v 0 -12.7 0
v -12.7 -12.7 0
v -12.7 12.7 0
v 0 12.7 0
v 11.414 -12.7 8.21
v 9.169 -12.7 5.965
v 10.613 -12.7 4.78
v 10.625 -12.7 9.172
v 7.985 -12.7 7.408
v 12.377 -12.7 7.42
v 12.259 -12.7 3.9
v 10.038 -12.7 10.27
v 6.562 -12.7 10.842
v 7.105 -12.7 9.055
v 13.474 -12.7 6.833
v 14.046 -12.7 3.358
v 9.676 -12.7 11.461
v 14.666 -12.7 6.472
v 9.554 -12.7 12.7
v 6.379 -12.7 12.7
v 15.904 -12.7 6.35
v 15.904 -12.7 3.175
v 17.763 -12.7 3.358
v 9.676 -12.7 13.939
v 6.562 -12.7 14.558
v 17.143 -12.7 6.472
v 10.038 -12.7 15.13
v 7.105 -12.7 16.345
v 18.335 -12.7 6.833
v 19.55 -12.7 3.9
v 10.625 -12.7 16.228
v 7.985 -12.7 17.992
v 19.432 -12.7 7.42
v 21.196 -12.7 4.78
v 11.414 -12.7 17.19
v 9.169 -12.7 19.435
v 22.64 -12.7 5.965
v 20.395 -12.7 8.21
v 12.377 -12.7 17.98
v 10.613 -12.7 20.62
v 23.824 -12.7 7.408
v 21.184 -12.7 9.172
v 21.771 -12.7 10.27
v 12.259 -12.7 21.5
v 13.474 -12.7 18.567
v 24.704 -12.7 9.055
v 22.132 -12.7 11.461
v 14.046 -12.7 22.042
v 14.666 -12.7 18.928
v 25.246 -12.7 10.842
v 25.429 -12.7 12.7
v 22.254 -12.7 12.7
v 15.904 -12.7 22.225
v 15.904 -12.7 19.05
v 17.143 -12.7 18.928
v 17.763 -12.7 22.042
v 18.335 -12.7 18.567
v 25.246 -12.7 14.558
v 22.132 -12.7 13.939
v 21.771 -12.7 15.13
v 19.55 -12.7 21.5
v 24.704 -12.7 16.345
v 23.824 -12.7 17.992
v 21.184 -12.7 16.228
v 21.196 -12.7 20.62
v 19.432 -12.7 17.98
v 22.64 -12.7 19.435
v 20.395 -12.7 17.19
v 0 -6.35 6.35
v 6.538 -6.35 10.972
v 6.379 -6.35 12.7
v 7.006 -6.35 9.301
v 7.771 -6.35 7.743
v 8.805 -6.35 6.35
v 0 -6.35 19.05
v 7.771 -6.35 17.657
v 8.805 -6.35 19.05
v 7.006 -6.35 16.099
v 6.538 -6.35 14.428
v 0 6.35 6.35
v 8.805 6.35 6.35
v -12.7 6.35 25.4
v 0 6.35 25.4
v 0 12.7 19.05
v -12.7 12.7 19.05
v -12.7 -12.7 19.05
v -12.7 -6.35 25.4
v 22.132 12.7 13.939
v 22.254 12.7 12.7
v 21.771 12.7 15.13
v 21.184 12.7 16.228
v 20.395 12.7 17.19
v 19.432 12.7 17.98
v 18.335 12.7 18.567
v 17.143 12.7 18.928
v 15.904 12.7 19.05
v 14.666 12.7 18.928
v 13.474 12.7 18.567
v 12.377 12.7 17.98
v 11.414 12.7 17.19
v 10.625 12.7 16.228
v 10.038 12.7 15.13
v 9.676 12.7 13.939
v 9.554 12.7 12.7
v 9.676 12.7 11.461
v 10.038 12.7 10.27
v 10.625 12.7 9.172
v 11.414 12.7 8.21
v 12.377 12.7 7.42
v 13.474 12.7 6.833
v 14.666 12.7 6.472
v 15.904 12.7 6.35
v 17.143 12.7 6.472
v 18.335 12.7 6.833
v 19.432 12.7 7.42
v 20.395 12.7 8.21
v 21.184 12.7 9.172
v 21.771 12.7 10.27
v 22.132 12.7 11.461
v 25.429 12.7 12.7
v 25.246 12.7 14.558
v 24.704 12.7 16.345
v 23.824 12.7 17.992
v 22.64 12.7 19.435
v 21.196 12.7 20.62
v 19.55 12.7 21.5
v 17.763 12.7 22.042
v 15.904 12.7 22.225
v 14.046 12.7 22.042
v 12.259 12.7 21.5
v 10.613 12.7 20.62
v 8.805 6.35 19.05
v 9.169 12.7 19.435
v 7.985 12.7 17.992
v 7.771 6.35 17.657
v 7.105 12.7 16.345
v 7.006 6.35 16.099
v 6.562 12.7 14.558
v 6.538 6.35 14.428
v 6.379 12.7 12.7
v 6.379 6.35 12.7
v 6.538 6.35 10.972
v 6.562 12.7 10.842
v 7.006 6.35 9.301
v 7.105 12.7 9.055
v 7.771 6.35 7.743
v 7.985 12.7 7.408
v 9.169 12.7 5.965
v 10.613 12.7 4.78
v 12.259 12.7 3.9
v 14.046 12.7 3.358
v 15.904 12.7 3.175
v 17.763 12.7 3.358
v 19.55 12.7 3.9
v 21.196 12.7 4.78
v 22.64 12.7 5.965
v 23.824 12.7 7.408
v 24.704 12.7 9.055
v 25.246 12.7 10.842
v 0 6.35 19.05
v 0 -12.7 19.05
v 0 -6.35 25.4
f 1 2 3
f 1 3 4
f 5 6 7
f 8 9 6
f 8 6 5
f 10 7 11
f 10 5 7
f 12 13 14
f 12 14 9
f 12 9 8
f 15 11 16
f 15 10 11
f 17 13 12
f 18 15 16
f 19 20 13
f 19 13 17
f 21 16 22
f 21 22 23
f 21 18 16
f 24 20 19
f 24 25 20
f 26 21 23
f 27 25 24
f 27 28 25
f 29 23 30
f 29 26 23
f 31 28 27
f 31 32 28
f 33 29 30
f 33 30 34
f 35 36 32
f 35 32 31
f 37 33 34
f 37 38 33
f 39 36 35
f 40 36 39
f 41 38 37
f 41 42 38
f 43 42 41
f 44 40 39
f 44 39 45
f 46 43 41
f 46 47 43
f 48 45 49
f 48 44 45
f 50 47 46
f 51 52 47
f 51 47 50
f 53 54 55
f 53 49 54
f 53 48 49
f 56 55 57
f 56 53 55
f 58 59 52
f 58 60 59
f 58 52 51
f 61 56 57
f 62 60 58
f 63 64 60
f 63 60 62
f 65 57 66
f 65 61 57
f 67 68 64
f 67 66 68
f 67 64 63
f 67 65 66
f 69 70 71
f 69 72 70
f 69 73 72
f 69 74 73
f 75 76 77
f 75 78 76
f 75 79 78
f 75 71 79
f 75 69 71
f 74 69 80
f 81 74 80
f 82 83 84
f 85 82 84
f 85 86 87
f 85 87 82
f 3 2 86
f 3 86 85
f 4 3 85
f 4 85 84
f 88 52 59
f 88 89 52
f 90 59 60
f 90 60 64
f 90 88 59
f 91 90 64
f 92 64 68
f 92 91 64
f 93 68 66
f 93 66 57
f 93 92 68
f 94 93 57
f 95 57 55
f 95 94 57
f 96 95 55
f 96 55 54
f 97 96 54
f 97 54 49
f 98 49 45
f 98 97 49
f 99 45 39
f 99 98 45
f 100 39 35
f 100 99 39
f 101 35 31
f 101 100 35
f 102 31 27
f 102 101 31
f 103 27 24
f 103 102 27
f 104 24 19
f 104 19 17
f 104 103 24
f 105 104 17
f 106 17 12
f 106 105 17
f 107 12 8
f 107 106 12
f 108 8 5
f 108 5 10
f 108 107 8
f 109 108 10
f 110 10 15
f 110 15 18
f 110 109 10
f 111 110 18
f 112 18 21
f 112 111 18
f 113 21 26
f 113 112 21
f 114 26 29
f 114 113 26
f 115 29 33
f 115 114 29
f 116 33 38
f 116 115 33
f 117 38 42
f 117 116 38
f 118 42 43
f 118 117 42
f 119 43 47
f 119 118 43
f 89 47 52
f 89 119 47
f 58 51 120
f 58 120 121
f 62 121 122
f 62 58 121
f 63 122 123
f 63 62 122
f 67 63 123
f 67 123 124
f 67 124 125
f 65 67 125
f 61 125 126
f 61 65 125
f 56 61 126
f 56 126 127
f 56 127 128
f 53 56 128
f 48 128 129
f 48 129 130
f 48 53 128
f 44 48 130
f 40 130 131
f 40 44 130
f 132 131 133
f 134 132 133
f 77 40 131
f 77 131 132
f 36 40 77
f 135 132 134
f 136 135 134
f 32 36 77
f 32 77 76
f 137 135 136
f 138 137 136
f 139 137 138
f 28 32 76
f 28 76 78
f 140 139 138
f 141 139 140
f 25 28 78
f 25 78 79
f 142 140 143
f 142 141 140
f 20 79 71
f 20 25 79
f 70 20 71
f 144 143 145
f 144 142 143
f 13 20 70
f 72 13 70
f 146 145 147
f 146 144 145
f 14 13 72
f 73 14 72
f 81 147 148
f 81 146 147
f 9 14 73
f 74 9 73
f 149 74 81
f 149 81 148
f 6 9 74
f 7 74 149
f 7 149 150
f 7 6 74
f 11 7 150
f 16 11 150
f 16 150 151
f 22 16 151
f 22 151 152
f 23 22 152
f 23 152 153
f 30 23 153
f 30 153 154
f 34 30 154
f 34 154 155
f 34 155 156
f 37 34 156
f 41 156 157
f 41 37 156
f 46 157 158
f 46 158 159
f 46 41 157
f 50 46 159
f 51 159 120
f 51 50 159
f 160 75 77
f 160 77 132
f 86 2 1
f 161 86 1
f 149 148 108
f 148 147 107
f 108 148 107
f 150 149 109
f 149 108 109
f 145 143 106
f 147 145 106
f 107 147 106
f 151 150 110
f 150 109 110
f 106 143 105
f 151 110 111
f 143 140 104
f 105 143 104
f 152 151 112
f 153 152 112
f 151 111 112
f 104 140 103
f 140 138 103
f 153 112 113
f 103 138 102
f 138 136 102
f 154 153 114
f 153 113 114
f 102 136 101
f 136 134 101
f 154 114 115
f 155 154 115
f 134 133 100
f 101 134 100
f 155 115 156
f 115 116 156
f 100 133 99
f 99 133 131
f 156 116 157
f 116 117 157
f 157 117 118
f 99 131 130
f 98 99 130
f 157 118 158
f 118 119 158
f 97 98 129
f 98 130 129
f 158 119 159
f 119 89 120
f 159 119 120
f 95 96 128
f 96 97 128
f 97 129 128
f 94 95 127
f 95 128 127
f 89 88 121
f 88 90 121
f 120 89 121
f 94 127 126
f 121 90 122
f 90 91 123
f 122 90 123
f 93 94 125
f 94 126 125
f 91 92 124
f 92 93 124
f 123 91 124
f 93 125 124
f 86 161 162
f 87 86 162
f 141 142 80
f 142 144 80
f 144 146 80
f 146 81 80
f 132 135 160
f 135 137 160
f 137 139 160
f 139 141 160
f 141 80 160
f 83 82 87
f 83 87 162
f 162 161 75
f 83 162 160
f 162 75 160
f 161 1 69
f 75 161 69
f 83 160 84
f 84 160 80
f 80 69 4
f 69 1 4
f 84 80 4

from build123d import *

# Parameters (mm, degrees)
F0_W      = 12.7
F0_H      = 25.4
F1_DEPTH  = 25.4
F3_DEPTH  = 25.4
F5_DEPTH  = 25.4
F6_W      = 12.7
F6_H      = 12.7
F7_DEPTH  = 12.7
F8_R      = 9.525
F8_R_2    = 6.35
F9_DEPTH  = 12.7
F11_DEPTH = 25.4


with BuildPart() as f1:
    # F0 (on Top) → F1 (new body)
    with BuildSketch(Plane.XY):
        with Locations((-6.35, 0)):
            Rectangle(F0_W, F0_H)
    extrude(amount=F1_DEPTH)

    # F2 (on face) → F3 (cut)
    with BuildSketch(Plane.YZ):
        Polygon((-12.7, 19.05), (-6.35, 25.4), (-12.7, 25.4), align=None)
    extrude(amount=-F3_DEPTH, mode=Mode.SUBTRACT)

    # F4 (on face) → F5 (cut)
    with BuildSketch(Plane.YZ):
        Polygon((12.7, 25.4), (6.35, 25.4), (12.7, 19.05), align=None)
    extrude(amount=-F5_DEPTH, mode=Mode.SUBTRACT)

    # F6 (on face) → F7 (join)
    with BuildSketch(Plane.YZ):
        with Locations((0, 12.7)):
            Rectangle(F6_W, F6_H)
    extrude(amount=F7_DEPTH)


with BuildPart() as f9:
    # F8 (on Front) → F9 (new body, symmetric)
    with BuildSketch(Plane.XZ):
        with Locations((15.9044696867, 12.7)):
            Circle(F8_R)
        with Locations((15.9044696867, 12.7)):
            Circle(F8_R_2, mode=Mode.SUBTRACT)
    extrude(amount=F9_DEPTH, both=True)


with BuildPart() as f1_1:
    add(f1.part)

    # F10: union F9
    add(f9.part)

    # F11 (cut): a face of the model
    f11_faces = [f1_1.faces().sort_by_distance(p)[0] for p in [
        (11.4105492836, -6.35, 12.7),
    ]]
    extrude(f11_faces, amount=-F11_DEPTH, mode=Mode.SUBTRACT)


solid = f1_1.part
